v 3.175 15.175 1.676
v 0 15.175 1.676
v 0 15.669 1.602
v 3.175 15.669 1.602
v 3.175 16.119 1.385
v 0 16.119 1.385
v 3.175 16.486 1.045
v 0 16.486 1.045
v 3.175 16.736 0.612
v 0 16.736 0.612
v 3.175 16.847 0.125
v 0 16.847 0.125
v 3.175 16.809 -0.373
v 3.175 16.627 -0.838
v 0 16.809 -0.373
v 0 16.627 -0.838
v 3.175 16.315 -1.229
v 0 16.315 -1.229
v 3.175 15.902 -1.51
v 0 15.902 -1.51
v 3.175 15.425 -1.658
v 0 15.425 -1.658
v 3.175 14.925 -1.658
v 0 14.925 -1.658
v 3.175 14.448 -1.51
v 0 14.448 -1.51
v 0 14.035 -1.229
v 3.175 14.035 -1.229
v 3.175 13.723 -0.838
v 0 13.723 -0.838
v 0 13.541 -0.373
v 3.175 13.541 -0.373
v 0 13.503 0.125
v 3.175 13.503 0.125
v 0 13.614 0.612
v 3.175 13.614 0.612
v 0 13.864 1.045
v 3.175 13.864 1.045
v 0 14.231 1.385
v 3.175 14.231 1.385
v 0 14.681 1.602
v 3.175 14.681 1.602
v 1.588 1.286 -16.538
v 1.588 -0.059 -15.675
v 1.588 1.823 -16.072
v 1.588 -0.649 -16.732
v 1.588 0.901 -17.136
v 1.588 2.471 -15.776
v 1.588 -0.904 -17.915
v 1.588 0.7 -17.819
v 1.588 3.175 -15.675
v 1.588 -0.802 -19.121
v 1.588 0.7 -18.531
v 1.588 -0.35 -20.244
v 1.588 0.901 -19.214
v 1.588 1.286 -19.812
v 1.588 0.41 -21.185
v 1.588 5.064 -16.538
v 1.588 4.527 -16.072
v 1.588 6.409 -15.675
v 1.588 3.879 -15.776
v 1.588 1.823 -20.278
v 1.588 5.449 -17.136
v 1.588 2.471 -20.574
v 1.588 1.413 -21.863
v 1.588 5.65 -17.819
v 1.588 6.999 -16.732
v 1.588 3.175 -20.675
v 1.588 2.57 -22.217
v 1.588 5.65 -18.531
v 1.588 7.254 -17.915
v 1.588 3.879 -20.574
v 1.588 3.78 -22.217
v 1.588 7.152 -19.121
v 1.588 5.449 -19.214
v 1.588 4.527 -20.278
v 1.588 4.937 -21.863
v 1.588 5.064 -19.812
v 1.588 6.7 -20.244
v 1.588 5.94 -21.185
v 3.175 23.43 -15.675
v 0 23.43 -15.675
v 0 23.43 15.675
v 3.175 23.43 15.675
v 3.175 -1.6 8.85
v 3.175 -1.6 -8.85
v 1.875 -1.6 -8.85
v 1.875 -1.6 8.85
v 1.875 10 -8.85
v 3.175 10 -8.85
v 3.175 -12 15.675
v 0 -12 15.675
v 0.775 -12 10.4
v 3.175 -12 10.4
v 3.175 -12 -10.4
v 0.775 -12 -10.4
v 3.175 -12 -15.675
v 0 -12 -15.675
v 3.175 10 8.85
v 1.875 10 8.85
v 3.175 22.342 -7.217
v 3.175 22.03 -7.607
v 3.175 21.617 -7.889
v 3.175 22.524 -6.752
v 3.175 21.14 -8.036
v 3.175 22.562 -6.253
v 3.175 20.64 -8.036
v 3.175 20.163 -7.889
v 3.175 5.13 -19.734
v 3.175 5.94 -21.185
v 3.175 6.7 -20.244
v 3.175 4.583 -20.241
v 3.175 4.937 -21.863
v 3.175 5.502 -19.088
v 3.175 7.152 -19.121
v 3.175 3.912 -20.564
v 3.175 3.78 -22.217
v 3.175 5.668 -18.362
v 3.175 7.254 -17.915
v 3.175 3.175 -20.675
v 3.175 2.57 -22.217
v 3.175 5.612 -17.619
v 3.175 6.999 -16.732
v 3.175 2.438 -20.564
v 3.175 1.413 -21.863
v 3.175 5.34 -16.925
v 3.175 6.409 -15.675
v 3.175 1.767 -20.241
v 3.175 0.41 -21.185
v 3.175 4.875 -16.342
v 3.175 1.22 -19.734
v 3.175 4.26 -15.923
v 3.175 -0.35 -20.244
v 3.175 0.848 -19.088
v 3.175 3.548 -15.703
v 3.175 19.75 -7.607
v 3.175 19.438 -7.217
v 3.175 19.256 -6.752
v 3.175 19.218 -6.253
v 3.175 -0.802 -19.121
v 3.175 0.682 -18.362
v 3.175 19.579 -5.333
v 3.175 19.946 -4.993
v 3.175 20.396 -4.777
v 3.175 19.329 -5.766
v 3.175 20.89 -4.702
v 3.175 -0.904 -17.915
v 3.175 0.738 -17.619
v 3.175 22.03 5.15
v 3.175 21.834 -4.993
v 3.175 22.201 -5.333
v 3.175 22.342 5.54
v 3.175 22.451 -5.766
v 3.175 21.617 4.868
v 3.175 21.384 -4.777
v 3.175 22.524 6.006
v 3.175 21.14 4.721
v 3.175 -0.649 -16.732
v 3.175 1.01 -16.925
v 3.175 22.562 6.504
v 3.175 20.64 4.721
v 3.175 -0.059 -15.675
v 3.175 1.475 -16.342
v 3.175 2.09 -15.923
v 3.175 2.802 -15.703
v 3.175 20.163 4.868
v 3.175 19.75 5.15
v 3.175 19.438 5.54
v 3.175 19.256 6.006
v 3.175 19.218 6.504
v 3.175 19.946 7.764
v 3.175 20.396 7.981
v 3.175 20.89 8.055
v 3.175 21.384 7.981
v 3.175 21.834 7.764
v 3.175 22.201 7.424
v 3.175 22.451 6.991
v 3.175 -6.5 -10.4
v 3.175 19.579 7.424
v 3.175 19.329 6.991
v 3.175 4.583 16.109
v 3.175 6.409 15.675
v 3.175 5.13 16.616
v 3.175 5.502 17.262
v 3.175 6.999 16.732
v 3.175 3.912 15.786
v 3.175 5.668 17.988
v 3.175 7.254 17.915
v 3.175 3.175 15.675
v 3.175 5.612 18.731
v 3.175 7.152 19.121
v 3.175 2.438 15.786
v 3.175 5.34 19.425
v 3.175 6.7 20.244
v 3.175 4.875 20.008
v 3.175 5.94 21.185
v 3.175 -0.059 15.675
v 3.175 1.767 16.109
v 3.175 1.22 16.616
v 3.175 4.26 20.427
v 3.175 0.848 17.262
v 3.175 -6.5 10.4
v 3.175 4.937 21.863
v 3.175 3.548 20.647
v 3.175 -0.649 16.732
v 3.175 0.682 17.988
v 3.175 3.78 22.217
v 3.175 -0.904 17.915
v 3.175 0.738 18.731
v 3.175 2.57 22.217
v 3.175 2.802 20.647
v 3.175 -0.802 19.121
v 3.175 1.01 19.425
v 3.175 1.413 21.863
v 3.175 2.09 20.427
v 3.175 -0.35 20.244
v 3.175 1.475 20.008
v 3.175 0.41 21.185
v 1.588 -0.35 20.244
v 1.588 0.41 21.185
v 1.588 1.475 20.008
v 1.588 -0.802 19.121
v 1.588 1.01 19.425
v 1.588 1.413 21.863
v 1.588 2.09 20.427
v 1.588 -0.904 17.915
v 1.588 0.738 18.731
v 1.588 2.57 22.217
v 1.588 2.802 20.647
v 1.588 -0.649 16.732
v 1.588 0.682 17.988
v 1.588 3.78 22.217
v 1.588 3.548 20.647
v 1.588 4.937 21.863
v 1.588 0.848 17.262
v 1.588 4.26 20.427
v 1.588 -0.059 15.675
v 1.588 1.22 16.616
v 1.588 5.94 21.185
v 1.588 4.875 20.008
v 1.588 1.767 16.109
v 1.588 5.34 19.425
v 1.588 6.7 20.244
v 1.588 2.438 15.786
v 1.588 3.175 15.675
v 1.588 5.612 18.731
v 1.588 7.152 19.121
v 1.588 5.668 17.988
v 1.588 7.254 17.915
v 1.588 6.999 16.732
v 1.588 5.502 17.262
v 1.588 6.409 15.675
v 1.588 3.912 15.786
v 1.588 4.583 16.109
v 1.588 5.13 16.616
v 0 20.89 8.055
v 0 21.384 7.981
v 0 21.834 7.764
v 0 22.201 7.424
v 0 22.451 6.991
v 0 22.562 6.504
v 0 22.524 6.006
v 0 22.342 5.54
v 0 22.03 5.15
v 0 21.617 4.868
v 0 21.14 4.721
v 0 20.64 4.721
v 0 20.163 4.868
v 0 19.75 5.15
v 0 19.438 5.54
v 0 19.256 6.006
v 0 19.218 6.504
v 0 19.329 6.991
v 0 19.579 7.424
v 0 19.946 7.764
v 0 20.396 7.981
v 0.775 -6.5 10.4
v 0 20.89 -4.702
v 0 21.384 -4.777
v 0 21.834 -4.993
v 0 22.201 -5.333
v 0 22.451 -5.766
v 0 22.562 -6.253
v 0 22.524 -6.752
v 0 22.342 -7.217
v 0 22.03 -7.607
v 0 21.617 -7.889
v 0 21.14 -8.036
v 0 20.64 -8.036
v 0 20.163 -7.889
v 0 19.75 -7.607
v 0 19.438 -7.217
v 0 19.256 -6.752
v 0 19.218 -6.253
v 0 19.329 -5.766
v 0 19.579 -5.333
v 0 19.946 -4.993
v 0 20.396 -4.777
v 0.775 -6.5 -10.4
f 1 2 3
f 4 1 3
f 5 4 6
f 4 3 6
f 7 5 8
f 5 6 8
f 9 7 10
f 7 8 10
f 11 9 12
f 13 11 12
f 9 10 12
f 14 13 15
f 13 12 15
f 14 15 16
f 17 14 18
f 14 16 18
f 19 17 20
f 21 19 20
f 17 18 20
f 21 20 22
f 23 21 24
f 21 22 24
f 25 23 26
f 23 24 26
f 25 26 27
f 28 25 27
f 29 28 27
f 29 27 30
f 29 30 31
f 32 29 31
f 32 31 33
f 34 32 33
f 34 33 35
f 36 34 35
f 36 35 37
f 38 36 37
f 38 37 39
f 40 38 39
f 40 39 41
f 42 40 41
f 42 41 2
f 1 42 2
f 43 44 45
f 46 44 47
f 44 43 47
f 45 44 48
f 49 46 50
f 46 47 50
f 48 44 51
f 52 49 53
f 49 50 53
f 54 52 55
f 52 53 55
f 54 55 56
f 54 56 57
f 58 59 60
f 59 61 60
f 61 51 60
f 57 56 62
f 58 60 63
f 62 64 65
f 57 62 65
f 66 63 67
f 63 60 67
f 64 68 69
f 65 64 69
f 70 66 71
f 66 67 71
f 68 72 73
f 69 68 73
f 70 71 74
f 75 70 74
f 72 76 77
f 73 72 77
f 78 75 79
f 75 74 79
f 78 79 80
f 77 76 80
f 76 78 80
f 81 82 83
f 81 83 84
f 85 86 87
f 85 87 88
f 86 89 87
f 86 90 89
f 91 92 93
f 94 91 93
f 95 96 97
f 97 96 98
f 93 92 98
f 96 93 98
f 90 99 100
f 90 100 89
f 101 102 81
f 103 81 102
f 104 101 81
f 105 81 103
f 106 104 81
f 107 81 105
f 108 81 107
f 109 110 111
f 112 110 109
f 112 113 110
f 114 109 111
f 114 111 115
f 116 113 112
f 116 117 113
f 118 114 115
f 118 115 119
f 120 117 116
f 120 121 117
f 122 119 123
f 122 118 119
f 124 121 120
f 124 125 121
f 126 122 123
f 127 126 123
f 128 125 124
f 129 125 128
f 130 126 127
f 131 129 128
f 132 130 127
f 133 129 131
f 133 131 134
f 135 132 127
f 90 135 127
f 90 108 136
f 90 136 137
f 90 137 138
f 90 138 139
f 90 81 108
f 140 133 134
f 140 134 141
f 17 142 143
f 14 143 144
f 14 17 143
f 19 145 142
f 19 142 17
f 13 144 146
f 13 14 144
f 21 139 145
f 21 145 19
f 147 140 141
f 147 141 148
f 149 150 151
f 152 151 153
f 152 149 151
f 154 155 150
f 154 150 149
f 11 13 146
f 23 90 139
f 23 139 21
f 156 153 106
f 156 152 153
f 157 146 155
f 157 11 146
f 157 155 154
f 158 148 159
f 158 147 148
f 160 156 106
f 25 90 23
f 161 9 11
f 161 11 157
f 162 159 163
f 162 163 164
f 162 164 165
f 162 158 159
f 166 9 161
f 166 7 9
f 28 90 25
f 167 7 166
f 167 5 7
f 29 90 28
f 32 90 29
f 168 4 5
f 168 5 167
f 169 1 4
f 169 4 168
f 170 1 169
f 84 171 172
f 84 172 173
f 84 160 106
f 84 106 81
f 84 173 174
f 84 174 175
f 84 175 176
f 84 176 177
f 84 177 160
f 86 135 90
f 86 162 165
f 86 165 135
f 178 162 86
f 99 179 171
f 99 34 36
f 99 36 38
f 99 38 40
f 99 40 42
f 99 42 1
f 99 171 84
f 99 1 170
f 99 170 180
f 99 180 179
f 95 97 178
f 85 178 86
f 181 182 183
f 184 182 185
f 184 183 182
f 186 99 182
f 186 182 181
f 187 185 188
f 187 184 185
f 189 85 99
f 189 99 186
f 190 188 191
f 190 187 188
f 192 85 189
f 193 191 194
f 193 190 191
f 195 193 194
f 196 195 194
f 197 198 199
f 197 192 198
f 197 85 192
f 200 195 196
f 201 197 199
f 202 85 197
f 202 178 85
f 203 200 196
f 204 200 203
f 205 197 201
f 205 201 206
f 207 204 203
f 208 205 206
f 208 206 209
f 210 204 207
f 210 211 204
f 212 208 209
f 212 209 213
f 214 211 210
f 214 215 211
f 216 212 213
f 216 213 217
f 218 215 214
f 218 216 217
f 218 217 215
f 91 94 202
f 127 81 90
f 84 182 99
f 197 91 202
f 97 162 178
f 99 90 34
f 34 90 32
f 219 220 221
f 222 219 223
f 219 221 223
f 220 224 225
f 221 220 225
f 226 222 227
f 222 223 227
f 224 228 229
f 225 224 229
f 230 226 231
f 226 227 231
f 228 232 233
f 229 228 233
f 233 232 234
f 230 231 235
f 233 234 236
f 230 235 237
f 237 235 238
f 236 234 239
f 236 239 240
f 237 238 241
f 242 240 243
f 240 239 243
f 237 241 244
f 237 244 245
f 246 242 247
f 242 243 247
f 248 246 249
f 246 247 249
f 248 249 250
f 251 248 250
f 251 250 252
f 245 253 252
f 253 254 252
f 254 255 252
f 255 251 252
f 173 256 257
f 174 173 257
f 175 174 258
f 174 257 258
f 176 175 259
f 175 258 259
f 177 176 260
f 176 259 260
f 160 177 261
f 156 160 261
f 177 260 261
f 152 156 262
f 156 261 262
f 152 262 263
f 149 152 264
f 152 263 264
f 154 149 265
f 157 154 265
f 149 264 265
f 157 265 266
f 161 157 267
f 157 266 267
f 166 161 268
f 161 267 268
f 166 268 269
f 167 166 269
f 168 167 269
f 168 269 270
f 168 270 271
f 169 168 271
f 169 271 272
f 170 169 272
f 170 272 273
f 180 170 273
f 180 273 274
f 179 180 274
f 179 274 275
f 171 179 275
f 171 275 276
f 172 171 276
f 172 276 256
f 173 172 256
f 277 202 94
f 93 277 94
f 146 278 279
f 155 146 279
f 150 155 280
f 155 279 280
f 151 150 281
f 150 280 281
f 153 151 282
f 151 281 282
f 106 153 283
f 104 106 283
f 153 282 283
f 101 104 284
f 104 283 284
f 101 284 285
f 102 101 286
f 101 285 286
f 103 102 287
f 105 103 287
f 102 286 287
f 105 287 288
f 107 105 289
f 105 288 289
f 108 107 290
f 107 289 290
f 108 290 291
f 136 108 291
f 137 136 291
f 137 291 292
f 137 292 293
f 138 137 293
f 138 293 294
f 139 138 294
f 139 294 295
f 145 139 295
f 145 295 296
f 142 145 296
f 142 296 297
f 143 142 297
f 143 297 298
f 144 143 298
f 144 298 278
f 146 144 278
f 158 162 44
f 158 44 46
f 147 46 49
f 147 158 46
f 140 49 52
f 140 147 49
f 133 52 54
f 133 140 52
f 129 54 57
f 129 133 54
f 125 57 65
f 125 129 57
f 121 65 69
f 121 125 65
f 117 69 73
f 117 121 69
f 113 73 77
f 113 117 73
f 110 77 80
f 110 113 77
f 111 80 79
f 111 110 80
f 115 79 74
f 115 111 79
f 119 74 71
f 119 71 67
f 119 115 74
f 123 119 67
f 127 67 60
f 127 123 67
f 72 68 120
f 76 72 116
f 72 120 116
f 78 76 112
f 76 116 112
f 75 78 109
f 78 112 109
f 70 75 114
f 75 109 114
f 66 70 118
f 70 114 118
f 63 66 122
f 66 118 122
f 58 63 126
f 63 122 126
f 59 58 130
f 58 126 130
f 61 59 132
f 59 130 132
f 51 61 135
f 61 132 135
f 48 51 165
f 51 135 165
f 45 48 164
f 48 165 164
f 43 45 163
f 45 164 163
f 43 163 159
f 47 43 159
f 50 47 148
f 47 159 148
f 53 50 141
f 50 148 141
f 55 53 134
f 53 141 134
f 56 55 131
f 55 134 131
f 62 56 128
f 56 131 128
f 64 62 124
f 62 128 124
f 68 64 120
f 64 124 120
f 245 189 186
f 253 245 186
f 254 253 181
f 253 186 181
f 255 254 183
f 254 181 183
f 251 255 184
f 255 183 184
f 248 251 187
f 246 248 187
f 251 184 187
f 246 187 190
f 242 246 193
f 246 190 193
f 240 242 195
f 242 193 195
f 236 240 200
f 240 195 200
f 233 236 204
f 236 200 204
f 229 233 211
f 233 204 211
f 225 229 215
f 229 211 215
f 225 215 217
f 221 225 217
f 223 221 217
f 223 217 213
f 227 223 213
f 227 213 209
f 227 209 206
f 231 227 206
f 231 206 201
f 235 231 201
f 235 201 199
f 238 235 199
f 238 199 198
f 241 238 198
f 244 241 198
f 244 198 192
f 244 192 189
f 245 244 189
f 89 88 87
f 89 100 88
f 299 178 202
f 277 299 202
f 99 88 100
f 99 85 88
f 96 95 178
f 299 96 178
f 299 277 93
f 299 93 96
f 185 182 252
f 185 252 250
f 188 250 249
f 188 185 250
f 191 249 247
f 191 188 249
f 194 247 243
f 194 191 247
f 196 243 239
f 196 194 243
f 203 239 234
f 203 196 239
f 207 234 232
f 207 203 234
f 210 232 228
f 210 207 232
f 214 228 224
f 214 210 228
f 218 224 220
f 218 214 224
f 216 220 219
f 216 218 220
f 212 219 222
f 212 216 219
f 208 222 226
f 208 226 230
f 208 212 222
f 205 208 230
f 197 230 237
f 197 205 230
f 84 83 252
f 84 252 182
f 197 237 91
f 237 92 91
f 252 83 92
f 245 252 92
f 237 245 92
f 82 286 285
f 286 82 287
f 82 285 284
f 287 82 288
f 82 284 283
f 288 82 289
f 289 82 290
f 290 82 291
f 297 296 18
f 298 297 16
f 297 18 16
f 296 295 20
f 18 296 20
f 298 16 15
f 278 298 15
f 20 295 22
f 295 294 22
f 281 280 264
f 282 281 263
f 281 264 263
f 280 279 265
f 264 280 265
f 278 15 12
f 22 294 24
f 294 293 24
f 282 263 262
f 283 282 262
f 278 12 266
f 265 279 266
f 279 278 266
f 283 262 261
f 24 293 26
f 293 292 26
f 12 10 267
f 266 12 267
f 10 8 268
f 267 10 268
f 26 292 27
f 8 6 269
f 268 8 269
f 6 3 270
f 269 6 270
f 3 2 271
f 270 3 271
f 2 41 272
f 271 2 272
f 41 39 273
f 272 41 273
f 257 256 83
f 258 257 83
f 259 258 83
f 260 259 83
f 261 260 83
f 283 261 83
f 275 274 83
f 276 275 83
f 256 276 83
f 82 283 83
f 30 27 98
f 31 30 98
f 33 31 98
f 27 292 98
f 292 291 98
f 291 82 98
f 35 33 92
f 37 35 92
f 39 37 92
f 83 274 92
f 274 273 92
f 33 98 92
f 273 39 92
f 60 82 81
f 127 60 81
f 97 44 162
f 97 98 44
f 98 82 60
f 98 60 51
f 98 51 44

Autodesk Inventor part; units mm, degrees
ref_plane "YZ Plane" through (0, 0, 0) normal (1, 0, 0) x (0, 1, 0)
ref_plane "XZ Plane" through (0, 0, 0) normal (0, 1, 0) x (-1, 0, 0)
ref_plane "XY Plane" through (0, 0, 0) normal (0, 0, 1) x (1, 0, 0)
sketch "Sketch2" plane through (0, 0, 0) normal (1, 0, 0) x (0, 1, 0)
  line L0 (12, 15.675) -> (-12, 15.675)
  line L1 (-12, 15.675) -> (-12, -15.675)
  line L2 (-12, -15.675) -> (12, -15.675)
  line L3 (12, -15.675) -> (12, 15.675)
  point P0 (0, 0)
  dimension "d4" = 24
  dimension "d5" = 31.35
  dimension "d6" = 15.675
  dimension "d7" = 12
extrude "Extrusion1" add sketch "Sketch2" along normal blind 3.175
sketch "Sketch3" plane through (3.175, 0, 0) normal (1, 0, 0) x (0, 0, -1)
  line L0 (-15.675, -12) -> (15.675, -12) projected
  line L1 (-10.4, -12) -> (10.4, -12)
  line L2 (10.4, -12) -> (10.4, -6.5)
  line L3 (10.4, -6.5) -> (-10.4, -6.5)
  line L4 (-10.4, -6.5) -> (-10.4, -12)
  point P0 (0, 0)
  dimension "d16" = 20.8
  dimension "d17" = 10.4
  dimension "d18" = 5.5
extrude "Extrusion2" cut sketch "Sketch3" against normal blind 2.4
sketch "Sketch4" plane through (3.175, 0, 0) normal (1, 0, 0) x (0, 0, -1)
  line L0 (-8.85, 10) -> (8.85, 10)
  line L1 (8.85, 10) -> (8.85, -1.6)
  line L2 (8.85, -1.6) -> (-8.85, -1.6)
  line L3 (-8.85, -1.6) -> (-8.85, 10)
  line L4 (-10.4, -6.5) -> (10.4, -6.5) projected
  line L5 (10.4, -12) -> (-10.4, -12) projected
  point P0 (0, 4.2)
  dimension "d21" = 17.7
  dimension "d22" = 8.85
  dimension "d23" = 5.8
  dimension "d24" = 11.6
  dimension "d27" = 10.4
extrude "Extrusion3" cut sketch "Sketch4" against normal blind 1.3
sketch "Sketch5" plane through (3.175, 0, 0) normal (1, 0, 0) x (0, 0, -1)
  circle A0 centre (-10.65, 10.9) radius 0.8411
  circle A1 centre (10.65, 10.9) radius 0.8411
  line L0 (-15.675, 12) -> (-15.675, -12) projected
  line L1 (15.675, 12) -> (-15.675, 12) projected
  line L2 (15.675, -12) -> (15.675, 12) projected
  line L3 (8.85, 10) -> (8.85, -1.6) projected
  line L4 (-8.85, 10) -> (8.85, 10) projected
  point P0 (0, 0)
  dimension "d31" = 1.6822
  dimension "d33" = 1.6822
  dimension "d60" = 1.8
  dimension "d62" = 0.9
  dimension "d67" = 0.9
  dimension "d68" = 1.8
extrude "Extrusion7" [suppressed]
sketch "Sketch10" plane through (3.175, 0, 0) normal (1, 0, 0) x (0, 0, -1)
  circle A0 centre (-18.175, 3.175) radius 2.5
  line L0 (-15.675, 12) -> (-15.675, -12) construction
  arc A1 (-15.675, 6.4088) -> (-15.675, -0.0588) centre (-18.175, 3.175) ccw
  line L1 (0, 13.5875) -> (0, -23.7475) construction
  circle A2 centre (18.175, 3.175) radius 2.5
  arc A3 (15.675, -0.0588) -> (15.675, 6.4088) centre (18.175, 3.175) ccw
  line L2 (15.675, 12) -> (-15.675, 12) projected
  line L3 (-15.675, 6.4088) -> (-15.675, -0.0588)
  line L4 (15.675, -12) -> (15.675, 12) projected
  line L5 (15.675, 6.4088) -> (15.675, -0.0588)
  point P0 (0, 0)
  dimension "d73" = 8.175
  dimension "d74" = 5
  dimension "d80" = 24
  dimension "d81" = 15.175
extrude "Extrusion13" add sketch "Sketch10" against normal blind 1.5875
sketch "Sketch12" plane through (0, 12, 15.675) normal (0, 1, 0) x (1, 0, 0)
  line L0 (0, 31.35) -> (0, 0) projected
  line L1 (0, 0) -> (3.175, 0) projected
  line L2 (3.175, 31.35) -> (3.175, 0) projected
  line L3 (0, 31.35) -> (3.175, 31.35) projected
  point P0 (0, 15.675)
extrude "Extrusion14" add sketch "Sketch12" along normal blind 11.43
sketch "Sketch13" plane through (0, 0, 0) normal (-1, 0, 0) x (0, 0, 1)
  circle A0 centre (-6.3786, 20.89) radius 1.6764
  circle A1 centre (6.3786, 20.89) radius 1.6764
  line L0 (-15.675, 23.43) -> (15.675, 23.43) projected
  line L1 (-15.675, -12) -> (-15.675, 23.43) projected
  line L2 (15.675, 23.43) -> (15.675, -12) projected
  circle A2 centre (0, 15.175) radius 1.6764
  point P0 (0, 0)
  dimension "d92" = 3.3528
  dimension "d93" = 3.3528
  dimension "d94" = 2.54
  dimension "d95" = 9.2964
  dimension "d96" = 9.2964
  dimension "d97" = 2.54
  dimension "d98" = 3.3528
  dimension "d99" = 8.255
  dimension "d100" = 31.35
  dimension "d101" = 15.675
extrude "Extrusion15" cut sketch "Sketch13" against normal through all
equation "\"d6\" = 0.5 * d5"
equation "\"d7\" = 0.5 * d4"
equation "\"d17\" = 0.5 * d16"
equation "\"d22\" = 0.5 * d21"
equation "\"d23\" = 0.5 * d24"
equation "\"d31\" = d30"
equation "\"d33\" = d30"
equation "\"d67\" = d62"
equation "\"d68\" = d60"
equation "\"d93\" = d92"
equation "\"d96\" = d95"
equation "\"d98\" = d92"
equation "\"d101\" = 0.5 * d100"
equation "\"d30\" = 1.682224"
properties part number "Pi cCam Mount" material "Aluminum 6061-AHC"
